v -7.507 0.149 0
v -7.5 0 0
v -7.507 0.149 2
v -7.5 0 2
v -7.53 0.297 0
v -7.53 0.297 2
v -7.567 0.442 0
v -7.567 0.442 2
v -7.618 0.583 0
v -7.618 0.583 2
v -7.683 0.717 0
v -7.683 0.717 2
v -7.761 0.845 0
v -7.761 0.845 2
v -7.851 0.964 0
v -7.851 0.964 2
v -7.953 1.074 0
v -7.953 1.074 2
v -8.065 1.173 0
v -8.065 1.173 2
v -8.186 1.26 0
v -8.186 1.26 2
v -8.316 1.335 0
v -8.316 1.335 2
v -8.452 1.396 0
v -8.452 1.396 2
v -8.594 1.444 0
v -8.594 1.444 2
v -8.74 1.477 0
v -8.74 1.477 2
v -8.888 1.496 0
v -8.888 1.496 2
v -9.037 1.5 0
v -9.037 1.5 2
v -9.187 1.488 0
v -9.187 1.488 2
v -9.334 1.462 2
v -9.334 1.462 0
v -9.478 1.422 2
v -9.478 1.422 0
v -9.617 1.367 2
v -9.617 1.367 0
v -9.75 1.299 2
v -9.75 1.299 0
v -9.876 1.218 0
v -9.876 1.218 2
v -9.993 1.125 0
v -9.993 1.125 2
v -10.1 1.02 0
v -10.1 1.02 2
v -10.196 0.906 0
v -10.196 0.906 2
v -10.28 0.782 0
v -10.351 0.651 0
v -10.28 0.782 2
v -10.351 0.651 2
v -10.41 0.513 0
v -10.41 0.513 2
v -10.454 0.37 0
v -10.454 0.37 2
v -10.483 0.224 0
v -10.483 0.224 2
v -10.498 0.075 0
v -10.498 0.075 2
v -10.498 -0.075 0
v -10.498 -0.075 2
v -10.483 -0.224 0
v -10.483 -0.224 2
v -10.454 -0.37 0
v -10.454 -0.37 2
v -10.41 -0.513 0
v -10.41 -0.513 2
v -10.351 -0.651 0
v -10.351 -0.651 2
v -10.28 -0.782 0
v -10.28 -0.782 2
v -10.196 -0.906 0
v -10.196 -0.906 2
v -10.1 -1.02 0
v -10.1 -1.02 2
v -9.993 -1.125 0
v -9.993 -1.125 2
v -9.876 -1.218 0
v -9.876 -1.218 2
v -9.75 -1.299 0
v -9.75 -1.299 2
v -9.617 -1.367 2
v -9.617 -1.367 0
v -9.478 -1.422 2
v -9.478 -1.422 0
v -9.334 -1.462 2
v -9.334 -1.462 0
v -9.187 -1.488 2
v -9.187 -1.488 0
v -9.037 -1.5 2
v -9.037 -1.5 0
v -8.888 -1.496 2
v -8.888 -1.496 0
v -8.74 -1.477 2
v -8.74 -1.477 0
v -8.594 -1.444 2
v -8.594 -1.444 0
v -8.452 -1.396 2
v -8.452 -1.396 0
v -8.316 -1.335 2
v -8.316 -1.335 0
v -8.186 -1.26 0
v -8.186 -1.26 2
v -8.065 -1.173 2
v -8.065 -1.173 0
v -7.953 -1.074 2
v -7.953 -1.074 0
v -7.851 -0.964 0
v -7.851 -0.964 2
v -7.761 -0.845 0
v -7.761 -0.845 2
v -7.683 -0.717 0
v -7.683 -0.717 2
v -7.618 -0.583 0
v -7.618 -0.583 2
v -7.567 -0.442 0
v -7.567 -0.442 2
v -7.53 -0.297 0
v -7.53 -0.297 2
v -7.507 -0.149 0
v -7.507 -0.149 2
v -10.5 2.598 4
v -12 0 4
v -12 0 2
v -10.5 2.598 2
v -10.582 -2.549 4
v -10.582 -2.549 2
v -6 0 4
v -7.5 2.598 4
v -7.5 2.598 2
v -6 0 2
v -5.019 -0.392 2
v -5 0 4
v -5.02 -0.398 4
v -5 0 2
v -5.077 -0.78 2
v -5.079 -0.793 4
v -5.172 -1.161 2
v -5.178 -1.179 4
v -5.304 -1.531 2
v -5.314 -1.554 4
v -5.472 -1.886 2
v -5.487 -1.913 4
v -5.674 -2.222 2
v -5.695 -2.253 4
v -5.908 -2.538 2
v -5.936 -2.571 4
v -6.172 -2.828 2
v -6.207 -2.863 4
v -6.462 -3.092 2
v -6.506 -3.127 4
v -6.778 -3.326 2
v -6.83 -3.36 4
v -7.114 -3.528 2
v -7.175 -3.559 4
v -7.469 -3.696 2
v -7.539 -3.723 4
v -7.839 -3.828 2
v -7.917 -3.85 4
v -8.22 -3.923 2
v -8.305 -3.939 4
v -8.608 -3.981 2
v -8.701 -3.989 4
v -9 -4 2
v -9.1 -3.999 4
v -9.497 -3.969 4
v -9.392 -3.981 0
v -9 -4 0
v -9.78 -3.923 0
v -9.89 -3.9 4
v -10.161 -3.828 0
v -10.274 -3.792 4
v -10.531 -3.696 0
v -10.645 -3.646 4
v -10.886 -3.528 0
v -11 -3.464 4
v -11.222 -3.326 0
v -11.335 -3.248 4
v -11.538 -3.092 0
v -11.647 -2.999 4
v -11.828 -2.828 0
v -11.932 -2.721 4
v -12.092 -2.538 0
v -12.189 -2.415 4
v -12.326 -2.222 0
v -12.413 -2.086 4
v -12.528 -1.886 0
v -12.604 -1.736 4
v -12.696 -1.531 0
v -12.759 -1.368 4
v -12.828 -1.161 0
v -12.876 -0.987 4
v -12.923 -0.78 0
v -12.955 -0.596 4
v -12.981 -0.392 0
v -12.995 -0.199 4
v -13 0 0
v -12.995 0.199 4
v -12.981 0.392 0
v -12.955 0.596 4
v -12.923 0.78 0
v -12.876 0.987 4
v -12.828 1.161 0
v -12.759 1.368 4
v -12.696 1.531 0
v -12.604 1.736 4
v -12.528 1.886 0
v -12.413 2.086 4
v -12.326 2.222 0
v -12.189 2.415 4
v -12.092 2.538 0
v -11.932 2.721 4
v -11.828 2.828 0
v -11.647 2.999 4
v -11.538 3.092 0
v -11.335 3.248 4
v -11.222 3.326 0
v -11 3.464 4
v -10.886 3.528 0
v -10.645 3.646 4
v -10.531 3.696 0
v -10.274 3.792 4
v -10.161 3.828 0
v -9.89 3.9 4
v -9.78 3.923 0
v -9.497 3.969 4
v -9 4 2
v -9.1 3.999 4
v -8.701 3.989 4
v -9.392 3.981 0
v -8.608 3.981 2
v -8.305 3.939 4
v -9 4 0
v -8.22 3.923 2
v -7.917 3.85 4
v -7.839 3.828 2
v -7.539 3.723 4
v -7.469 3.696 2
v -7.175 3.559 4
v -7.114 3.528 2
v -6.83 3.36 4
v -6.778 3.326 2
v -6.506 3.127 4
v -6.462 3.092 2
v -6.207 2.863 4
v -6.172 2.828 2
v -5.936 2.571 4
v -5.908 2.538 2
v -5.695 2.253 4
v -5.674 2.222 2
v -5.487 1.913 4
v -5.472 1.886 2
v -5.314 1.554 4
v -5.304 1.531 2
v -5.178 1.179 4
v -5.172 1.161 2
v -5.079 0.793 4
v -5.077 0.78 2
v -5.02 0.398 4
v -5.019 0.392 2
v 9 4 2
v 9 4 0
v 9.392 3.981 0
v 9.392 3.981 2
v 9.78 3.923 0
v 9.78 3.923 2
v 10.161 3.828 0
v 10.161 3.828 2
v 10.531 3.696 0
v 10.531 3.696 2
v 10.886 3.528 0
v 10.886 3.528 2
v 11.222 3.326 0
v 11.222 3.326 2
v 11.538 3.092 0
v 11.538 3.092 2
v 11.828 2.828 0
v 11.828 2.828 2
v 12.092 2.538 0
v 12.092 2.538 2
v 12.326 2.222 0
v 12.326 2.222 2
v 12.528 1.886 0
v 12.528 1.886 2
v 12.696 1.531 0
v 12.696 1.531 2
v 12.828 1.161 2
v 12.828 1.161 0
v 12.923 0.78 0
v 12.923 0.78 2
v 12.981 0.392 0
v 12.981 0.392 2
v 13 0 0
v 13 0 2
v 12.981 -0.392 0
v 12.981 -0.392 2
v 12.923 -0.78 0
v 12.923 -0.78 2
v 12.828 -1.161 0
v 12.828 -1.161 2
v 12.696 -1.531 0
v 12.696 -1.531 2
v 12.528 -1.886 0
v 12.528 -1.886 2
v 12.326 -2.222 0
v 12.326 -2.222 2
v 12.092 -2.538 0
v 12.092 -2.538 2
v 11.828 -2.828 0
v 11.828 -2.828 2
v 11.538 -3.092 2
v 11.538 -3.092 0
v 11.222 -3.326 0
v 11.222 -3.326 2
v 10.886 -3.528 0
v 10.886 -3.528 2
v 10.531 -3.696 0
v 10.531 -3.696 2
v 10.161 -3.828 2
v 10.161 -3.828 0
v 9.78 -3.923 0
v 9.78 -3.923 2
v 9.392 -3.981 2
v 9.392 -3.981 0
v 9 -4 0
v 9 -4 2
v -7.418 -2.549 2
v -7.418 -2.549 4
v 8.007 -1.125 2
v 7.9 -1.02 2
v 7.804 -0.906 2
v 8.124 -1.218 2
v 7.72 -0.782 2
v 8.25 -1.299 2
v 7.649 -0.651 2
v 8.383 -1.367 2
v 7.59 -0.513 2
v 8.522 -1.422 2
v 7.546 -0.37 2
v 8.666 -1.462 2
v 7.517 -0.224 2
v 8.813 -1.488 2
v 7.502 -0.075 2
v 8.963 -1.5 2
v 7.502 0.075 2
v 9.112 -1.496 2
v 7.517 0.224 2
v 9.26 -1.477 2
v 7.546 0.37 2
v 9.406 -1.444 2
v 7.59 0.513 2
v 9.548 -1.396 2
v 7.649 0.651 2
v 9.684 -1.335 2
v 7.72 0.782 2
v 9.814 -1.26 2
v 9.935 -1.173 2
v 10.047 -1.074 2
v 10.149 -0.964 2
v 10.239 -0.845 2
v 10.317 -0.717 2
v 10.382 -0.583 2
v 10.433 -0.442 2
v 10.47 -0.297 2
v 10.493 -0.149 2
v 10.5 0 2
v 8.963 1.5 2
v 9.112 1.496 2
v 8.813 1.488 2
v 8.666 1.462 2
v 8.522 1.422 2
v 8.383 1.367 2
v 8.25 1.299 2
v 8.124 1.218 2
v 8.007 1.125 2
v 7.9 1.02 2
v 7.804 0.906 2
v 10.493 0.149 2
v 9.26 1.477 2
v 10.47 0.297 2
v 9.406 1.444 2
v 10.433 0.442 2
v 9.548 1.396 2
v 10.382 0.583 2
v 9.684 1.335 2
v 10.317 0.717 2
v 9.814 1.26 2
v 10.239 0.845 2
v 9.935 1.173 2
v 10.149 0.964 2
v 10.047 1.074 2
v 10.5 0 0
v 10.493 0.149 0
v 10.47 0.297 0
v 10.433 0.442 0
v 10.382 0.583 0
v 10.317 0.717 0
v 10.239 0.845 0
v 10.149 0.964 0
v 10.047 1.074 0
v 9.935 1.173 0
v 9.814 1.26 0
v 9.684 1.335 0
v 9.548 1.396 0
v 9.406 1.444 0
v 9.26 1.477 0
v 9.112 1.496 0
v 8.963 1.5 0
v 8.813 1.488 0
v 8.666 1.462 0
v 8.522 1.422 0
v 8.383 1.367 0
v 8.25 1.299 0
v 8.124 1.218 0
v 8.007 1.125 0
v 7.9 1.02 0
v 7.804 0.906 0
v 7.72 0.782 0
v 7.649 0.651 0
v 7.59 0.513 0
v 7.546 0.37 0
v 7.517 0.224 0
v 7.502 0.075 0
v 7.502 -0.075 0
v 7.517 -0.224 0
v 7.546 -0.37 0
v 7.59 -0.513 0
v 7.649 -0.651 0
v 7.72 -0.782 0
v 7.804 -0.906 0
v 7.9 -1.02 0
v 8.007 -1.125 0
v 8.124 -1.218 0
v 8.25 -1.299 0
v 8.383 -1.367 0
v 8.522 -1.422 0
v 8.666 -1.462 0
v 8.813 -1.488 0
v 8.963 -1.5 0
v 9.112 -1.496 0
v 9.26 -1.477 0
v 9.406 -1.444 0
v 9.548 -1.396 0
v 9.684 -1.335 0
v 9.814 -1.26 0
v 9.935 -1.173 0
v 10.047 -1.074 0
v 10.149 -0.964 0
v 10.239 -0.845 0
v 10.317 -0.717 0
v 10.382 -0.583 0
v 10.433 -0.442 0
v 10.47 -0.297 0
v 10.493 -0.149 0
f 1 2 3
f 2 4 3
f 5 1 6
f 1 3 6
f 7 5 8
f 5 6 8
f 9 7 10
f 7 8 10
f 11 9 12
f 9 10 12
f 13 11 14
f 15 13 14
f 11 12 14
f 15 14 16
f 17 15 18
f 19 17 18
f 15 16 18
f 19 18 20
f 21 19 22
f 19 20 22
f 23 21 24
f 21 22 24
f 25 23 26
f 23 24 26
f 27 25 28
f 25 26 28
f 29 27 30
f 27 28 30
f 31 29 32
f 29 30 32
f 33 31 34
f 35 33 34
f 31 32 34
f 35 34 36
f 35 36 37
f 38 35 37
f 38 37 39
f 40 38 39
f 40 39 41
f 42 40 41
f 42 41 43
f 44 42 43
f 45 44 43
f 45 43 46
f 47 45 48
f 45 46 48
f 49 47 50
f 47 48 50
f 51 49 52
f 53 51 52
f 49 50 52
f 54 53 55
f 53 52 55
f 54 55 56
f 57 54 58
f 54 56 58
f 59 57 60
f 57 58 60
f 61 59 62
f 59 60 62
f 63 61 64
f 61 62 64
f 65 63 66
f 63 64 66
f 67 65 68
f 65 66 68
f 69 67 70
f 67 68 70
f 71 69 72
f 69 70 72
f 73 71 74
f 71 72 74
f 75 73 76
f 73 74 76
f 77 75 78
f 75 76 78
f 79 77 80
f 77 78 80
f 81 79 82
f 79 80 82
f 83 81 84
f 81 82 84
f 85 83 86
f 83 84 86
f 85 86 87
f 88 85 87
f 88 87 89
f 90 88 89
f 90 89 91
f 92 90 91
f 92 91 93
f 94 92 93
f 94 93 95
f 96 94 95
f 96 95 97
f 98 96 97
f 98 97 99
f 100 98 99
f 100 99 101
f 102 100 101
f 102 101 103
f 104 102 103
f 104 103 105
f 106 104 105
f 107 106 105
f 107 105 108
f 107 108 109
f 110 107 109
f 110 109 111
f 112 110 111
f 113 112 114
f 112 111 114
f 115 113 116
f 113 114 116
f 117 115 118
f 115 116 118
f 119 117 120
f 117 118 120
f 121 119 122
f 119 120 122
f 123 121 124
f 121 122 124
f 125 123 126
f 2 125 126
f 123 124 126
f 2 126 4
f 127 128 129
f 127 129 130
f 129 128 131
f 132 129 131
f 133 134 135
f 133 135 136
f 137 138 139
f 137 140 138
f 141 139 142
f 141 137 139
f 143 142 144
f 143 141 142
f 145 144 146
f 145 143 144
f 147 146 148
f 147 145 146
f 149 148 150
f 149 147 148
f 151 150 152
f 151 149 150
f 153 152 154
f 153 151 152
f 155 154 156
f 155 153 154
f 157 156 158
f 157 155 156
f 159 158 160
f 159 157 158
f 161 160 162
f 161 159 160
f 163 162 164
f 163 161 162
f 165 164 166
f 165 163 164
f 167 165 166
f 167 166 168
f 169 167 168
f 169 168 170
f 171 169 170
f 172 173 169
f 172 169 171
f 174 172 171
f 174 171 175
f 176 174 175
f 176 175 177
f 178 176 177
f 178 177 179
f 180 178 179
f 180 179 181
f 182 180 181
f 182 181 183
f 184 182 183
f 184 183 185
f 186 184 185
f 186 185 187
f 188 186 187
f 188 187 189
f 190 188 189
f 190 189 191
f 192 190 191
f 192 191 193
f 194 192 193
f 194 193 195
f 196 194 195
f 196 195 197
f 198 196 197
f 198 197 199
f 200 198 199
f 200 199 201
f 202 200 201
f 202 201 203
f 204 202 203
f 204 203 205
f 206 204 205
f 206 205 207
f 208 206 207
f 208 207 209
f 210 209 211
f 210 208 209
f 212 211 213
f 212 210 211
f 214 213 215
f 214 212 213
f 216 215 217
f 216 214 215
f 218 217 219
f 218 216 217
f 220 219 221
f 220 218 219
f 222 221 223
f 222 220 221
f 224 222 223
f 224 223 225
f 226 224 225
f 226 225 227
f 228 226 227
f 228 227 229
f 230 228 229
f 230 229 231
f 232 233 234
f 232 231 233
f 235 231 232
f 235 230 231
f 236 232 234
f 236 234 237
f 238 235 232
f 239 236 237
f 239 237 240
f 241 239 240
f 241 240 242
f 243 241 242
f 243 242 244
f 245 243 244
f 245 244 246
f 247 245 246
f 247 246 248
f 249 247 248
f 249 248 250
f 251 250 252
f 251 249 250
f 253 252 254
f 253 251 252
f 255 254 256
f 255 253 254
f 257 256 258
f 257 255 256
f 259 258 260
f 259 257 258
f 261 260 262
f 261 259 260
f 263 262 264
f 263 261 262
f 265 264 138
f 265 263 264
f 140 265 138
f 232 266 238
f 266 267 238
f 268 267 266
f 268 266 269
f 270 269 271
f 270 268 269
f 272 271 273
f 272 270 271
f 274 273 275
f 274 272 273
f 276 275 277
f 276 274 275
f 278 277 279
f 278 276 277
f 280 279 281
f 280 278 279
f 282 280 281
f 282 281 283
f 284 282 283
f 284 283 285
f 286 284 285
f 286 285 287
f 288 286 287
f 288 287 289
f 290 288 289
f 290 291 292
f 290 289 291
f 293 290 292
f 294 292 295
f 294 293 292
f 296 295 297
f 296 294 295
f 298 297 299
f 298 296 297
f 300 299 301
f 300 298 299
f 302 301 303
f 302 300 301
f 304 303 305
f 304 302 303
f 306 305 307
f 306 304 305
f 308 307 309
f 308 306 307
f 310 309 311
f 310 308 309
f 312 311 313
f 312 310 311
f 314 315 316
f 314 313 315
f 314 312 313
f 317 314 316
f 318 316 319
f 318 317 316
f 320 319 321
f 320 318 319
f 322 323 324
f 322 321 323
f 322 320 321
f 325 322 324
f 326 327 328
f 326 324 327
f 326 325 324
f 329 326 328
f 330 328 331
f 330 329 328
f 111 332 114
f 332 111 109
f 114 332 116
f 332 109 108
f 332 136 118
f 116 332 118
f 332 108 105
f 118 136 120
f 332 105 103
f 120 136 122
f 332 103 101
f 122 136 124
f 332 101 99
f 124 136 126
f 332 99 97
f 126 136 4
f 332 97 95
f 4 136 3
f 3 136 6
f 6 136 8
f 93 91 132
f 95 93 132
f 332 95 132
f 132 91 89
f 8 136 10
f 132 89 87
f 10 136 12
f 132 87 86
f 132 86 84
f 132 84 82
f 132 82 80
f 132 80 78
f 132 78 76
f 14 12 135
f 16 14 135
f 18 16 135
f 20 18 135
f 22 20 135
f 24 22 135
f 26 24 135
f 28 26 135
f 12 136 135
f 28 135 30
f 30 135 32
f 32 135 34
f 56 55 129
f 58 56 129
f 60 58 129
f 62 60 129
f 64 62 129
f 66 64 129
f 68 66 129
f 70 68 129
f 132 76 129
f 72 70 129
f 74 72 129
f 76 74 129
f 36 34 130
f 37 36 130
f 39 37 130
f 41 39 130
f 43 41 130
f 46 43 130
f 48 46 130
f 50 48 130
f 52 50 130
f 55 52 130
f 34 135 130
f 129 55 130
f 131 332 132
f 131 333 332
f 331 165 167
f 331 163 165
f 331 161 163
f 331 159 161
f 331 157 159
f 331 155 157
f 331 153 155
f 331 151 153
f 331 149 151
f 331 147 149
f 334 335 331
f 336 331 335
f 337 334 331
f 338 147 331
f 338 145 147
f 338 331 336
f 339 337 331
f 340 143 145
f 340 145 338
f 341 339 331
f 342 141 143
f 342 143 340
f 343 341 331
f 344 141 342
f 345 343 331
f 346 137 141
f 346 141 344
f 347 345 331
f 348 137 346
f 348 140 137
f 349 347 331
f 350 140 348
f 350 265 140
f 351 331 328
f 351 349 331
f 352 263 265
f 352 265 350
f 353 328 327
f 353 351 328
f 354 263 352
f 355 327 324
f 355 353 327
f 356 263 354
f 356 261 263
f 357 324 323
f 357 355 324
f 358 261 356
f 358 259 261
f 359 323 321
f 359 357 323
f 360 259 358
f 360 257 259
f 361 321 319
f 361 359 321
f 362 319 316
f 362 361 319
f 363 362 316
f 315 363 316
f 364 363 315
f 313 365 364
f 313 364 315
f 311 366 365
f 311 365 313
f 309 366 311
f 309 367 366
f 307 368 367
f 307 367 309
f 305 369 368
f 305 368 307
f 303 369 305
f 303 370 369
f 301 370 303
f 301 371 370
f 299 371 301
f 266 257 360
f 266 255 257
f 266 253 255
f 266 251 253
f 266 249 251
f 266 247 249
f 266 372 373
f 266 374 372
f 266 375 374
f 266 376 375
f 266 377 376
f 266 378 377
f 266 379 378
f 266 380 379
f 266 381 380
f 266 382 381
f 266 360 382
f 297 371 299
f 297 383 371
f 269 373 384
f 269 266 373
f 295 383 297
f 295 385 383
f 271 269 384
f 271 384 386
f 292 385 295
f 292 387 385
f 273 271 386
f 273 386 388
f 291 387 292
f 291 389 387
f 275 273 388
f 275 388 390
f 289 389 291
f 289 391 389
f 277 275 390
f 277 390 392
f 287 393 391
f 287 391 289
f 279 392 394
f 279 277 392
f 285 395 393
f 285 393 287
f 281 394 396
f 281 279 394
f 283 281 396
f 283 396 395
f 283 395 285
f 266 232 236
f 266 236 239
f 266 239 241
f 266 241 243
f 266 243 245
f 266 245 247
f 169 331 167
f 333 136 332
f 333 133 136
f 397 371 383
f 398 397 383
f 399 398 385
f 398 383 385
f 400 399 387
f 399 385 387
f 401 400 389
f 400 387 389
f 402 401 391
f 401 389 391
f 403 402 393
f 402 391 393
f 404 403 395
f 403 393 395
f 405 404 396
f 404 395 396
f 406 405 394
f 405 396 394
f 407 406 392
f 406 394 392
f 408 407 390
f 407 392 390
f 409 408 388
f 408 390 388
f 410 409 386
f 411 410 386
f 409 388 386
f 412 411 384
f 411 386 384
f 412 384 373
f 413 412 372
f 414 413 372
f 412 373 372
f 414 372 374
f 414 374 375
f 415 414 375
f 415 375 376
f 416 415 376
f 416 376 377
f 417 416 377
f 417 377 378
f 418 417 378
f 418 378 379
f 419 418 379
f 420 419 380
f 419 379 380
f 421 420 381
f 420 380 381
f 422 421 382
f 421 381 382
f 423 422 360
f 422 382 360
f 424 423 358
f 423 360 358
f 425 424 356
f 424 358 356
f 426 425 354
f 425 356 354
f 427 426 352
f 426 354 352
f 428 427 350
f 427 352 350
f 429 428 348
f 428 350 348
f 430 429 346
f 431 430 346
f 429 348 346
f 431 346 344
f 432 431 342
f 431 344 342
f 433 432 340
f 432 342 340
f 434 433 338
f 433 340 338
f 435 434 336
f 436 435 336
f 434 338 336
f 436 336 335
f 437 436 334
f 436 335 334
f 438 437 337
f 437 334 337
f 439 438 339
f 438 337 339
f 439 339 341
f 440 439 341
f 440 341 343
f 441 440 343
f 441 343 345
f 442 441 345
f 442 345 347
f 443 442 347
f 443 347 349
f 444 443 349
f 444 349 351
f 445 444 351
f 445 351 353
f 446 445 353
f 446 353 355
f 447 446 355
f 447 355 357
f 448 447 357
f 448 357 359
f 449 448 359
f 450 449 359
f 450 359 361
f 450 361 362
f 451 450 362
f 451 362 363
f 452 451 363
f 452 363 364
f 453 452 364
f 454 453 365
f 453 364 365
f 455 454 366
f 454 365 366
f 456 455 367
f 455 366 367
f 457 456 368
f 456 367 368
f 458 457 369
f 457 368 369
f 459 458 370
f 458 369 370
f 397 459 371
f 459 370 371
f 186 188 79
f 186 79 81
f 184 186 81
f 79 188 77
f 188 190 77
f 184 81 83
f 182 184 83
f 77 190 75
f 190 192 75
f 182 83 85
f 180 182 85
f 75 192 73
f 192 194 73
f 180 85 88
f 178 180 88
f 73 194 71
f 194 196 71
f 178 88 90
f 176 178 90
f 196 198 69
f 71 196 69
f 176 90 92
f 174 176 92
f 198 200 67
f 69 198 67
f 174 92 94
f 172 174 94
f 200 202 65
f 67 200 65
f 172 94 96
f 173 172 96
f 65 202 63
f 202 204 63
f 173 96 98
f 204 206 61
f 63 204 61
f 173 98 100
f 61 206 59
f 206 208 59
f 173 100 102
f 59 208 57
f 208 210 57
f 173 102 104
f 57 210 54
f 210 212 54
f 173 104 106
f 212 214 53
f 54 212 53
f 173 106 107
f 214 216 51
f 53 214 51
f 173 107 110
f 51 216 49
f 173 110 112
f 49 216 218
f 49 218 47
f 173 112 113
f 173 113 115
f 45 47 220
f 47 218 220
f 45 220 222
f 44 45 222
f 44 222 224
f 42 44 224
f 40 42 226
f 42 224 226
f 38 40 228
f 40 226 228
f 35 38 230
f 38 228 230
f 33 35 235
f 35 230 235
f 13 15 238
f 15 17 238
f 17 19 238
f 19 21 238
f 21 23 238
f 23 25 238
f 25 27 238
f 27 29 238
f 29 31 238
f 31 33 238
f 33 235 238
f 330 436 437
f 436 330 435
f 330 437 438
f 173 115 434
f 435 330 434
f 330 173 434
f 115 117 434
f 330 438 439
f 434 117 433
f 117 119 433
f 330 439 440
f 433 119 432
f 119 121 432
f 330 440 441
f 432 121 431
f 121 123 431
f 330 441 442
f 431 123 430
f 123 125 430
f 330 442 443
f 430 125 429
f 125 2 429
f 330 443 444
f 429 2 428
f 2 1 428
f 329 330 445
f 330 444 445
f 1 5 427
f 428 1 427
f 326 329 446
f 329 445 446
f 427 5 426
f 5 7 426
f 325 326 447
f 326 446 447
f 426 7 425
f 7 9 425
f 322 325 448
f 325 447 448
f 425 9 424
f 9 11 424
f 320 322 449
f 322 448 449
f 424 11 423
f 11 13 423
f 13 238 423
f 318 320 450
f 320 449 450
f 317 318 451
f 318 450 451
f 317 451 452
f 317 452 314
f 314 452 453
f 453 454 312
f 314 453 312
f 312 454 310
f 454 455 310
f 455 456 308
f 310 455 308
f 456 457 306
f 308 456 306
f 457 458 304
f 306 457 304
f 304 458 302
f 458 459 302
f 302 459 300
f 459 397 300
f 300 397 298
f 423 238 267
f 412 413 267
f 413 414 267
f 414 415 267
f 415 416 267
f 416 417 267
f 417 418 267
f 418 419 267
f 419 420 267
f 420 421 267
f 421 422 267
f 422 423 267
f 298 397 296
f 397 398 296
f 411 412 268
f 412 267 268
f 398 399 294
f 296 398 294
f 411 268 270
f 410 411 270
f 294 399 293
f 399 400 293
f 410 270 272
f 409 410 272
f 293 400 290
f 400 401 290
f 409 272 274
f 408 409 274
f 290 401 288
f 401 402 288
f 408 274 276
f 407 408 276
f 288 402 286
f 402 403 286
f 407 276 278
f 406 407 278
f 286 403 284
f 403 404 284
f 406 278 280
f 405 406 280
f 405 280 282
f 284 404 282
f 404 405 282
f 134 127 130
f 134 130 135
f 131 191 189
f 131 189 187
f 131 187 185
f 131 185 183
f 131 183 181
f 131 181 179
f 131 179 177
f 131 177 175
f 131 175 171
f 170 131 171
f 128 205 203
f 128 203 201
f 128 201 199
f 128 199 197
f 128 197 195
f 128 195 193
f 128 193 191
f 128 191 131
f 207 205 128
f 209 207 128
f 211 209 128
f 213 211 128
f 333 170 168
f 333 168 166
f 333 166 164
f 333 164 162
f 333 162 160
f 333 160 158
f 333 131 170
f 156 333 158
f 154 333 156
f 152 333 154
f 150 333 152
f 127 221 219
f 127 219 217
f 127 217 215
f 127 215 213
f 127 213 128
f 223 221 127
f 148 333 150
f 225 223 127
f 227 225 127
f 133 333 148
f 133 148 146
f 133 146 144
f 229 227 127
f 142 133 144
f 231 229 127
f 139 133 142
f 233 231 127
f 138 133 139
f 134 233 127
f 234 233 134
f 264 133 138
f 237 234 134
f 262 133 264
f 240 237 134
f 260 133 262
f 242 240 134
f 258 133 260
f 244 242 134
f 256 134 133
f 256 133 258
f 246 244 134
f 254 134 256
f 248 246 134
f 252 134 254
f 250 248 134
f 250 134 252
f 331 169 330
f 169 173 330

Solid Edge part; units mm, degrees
sketch "Sketch1" plane through (0, 0, 0) normal (0, 0, 1) x (1, 0, 0)
  line L0 (-9, -4) -> (9, -4)
  line L1 (9, 4) -> (-9, 4)
  arc A0 (-9, 4) -> (-9, -4) centre (-9, 0) ccw
  arc A1 (9, -4) -> (9, 4) centre (9, 0) ccw
extrude "Protrusion1" add sketch "Sketch1" along normal blind 2
sketch "Sketch2" plane through (0, 0, 2) normal (0, 0, 1) x (1, 0, 0)
  circle A0 centre (9, 0) radius 1.5
extrude "Cutout1" cut sketch "Sketch2" against normal up to next
sketch "Sketch3" plane through (0, 0, 2) normal (0, 0, 1) x (1, 0, 0)
  circle A0 centre (-9, 0) radius 4
extrude "body_head_screw" add sketch "Sketch3" along normal blind 2
sketch "Sketch4" plane through (-9, 0, 4) normal (0, 0, 1) x (1, 0, 0)
  circle A0 centre (0, 0) radius 1.5
extrude "Cutout2" cut sketch "Sketch4" against normal up to next
sketch "Sketch5" plane through (-9, 0, 4) normal (0, 0, 1) x (1, 0, 0)
  line L0 (-3, 0) -> (-1.5, 2.5981)
  line L1 (-1.5, 2.5981) -> (1.5, 2.5981)
  line L2 (1.5, 2.5981) -> (3, 0)
  line L3 (3, 0) -> (1.5816, -2.5492)
  line L4 (1.5816, -2.5492) -> (-1.5816, -2.5492)
  line L5 (-3, 0) -> (-1.5816, -2.5492)
extrude "fix_screw_head" cut sketch "Sketch5" against normal blind 2
